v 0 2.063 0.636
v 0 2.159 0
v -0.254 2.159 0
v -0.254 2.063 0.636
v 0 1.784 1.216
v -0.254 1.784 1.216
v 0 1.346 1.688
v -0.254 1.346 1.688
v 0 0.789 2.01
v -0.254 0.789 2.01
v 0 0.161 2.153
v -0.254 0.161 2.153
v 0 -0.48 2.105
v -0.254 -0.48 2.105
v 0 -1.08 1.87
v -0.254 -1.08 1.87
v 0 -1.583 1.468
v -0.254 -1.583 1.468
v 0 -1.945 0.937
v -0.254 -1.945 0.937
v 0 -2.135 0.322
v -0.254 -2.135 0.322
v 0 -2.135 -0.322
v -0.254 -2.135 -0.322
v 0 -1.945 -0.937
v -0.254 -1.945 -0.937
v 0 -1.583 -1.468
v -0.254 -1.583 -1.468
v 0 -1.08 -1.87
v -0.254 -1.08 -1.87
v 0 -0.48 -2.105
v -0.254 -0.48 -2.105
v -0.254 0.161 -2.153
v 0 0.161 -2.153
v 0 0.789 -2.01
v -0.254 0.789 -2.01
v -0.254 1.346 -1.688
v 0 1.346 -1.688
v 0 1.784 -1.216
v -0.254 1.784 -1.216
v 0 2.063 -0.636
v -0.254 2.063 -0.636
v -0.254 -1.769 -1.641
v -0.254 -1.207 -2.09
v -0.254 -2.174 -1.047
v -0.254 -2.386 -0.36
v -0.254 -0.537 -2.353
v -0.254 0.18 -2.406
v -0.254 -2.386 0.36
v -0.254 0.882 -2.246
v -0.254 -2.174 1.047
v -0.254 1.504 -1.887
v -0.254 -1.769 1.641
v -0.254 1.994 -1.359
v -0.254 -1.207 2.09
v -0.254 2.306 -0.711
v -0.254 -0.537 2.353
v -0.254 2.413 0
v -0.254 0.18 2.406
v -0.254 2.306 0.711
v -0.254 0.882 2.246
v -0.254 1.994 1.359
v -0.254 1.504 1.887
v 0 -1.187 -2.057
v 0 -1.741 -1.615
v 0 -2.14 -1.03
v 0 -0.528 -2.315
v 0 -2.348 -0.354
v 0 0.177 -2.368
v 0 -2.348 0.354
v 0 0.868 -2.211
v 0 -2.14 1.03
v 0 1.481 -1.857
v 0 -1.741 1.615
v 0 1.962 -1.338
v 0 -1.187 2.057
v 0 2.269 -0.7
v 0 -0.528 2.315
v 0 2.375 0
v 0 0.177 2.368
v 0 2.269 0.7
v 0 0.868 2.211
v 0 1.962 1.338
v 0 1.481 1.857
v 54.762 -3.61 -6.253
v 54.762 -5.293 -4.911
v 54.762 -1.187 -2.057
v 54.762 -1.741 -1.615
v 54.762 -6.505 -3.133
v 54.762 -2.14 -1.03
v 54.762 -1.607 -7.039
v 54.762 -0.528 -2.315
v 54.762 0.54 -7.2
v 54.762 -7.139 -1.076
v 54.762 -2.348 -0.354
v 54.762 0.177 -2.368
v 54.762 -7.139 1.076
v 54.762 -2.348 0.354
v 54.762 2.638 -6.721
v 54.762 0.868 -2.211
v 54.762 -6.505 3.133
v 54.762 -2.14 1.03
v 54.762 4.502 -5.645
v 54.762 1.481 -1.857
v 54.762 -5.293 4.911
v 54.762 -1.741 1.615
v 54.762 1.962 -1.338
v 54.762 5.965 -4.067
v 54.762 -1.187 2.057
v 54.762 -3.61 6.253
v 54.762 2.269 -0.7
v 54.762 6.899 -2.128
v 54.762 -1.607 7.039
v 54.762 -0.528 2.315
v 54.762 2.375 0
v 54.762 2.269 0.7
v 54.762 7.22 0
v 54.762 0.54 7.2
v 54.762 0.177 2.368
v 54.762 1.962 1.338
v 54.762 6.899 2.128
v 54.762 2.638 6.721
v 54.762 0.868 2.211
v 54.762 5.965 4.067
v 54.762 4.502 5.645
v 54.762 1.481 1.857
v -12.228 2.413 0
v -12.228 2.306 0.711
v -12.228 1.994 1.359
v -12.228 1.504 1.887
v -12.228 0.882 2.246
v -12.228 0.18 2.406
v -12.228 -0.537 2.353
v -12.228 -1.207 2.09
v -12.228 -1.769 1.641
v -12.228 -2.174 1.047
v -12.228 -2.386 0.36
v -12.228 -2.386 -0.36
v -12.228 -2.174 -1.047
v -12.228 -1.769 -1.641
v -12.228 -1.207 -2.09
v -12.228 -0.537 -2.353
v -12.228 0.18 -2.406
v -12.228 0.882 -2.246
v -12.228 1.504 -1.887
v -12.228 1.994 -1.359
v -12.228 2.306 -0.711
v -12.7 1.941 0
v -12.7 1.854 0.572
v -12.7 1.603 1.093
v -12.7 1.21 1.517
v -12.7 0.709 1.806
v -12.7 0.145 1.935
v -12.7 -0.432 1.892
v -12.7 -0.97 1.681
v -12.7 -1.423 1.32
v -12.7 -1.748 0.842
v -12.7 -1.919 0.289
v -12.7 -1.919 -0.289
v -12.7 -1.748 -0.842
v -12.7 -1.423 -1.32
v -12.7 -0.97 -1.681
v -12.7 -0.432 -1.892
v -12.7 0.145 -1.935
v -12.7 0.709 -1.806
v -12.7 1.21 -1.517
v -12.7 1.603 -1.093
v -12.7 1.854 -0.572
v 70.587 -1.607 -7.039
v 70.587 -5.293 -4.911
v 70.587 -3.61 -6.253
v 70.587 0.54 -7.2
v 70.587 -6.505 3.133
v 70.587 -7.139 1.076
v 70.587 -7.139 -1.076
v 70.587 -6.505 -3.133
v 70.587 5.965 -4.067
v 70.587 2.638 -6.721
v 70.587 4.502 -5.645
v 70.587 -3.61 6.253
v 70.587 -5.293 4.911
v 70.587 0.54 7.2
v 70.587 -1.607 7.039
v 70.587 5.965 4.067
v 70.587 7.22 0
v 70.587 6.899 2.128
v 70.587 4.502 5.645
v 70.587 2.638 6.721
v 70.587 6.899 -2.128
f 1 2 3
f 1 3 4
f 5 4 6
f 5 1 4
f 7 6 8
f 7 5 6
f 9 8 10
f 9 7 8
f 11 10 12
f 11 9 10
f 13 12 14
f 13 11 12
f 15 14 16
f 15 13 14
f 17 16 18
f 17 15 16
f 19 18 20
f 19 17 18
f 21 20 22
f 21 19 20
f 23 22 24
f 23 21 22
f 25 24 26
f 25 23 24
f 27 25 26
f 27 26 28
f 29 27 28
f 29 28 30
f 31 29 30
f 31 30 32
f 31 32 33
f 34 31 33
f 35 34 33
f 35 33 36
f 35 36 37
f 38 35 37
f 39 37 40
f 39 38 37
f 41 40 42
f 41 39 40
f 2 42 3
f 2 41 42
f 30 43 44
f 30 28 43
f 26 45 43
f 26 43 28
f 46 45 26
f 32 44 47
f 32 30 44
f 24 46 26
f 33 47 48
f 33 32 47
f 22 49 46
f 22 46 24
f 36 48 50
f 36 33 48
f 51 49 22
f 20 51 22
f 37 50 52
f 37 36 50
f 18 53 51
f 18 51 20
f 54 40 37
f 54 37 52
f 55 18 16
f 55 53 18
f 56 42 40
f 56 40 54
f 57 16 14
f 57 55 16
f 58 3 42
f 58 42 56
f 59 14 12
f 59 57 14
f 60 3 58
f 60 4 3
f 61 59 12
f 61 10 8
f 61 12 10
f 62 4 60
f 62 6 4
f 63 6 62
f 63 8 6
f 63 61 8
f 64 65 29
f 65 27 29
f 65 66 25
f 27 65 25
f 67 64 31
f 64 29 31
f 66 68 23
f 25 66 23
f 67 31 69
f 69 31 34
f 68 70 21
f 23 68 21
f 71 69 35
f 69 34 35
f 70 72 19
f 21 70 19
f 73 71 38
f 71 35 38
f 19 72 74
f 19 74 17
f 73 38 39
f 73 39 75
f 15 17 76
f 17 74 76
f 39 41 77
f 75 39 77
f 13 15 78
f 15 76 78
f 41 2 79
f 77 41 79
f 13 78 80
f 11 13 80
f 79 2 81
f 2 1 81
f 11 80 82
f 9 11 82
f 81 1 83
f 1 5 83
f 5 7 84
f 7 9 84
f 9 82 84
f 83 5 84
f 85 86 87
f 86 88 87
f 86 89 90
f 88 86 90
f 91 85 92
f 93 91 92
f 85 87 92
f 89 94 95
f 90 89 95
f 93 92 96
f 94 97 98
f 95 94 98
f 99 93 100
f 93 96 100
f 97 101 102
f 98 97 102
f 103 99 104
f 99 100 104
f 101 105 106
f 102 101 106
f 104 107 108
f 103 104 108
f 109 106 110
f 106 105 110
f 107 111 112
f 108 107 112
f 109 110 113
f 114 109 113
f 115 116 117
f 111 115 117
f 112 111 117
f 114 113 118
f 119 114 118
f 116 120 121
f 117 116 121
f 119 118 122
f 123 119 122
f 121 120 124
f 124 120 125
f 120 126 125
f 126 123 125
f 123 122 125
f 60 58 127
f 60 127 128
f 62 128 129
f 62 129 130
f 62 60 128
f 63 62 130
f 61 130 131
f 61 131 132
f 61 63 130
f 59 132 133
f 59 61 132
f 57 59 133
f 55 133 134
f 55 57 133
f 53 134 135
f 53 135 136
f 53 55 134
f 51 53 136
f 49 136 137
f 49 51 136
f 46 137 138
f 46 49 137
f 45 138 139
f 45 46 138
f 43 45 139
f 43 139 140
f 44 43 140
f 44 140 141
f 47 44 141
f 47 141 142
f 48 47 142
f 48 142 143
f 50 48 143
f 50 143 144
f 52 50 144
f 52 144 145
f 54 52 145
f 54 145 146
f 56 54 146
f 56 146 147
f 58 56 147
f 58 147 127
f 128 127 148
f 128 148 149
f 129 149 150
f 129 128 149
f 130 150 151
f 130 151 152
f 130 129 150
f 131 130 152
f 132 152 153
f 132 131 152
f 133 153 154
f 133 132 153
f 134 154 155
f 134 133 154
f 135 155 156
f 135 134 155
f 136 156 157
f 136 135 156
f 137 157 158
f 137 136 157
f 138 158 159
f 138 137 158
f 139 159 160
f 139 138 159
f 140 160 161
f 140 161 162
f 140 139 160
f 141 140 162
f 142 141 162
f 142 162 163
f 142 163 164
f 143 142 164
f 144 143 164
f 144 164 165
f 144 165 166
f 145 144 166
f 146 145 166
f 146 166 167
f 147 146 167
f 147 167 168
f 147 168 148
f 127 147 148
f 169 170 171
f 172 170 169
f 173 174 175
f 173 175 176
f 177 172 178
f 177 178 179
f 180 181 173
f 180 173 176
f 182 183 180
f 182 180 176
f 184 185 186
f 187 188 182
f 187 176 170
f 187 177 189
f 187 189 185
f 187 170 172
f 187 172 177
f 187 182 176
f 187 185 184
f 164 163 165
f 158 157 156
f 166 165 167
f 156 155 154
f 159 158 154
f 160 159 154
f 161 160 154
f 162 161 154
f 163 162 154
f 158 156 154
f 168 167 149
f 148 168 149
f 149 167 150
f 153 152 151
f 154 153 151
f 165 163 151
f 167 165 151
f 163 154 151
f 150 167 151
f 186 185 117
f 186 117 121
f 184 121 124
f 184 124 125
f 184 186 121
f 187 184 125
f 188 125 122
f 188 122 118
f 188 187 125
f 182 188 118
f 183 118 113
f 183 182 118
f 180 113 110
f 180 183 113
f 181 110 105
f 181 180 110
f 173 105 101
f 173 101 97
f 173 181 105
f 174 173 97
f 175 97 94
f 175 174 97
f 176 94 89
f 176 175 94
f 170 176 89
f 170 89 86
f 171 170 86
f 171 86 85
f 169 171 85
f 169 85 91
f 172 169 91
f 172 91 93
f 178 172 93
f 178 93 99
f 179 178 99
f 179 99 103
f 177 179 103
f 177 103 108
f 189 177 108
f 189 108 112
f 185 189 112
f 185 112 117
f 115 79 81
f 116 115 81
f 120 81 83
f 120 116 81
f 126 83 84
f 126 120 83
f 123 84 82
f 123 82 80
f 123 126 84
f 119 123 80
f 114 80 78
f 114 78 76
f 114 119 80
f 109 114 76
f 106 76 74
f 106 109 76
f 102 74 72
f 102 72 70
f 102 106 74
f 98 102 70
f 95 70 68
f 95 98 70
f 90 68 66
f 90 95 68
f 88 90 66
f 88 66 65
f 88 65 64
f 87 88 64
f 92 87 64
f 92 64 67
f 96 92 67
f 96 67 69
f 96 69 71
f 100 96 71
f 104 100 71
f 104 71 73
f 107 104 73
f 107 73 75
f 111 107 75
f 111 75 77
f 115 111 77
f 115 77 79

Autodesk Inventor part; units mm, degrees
sketch "Sketch_1" plane through (0, 0, 0) normal (0, 0, 1) x (1, 0, 0)
  line L0 (70.5866, 0) -> (0, 0)
  line L1 (0, 0) -> (0, 2.3749)
  line L2 (0, 2.3749) -> (54.7624, 2.3749)
  line L3 (54.7624, 2.3749) -> (54.7624, 7.22)
  line L4 (54.7624, 7.22) -> (70.5866, 7.22)
  line L5 (70.5866, 7.22) -> (70.5866, 0)
  line L6 (70.5866, 0) -> (0, 0)
revolve "Revolution1" add sketch "Sketch_1" angle 360 about axis through (70.5866, 0, 0) along (1, 0, 0)
sketch "Sketch_3" plane through (0, 0, 0) normal (0, 0, 1) x (1, 0, 0)
  line L0 (0, 0) -> (-12.7, 0)
  line L1 (-12.7, 0) -> (-12.7, 1.9406)
  line L2 (-12.7, 1.9406) -> (-12.2276, 2.413)
  line L3 (-12.2276, 2.413) -> (0, 2.413)
  line L4 (0, 2.413) -> (0, 0)
  line L5 (0, 0) -> (-12.7, 0)
revolve "Revolution2" add sketch "Sketch_3" angle 360 about axis through (0, 0, 0) along (1, 0, 0)
thread "Thread1" size "10-32 UNF" class "2A" standard "ANSI Unified Screw Threads" full length
sketch "Sketch_30" plane through (0, 0, 0) normal (0, 0, 1) x (1, 0, 0)
  line L0 (0, 0) -> (-0.254, 0)
  line L1 (-0.254, 2.159) -> (0, 2.159)
  line L2 (0, 2.159) -> (0, 2.667)
  line L3 (0, 2.667) -> (-0.254, 2.667)
  line L4 (-0.254, 2.667) -> (-0.254, 2.159)
revolve "Revolution3" cut sketch "Sketch_30" angle 360 about axis through (0, 0, 0) along (1, 0, 0)
ref_plane "dia1_XY" through (0, 2.3749, 0) normal (1, 0, 0) x (0, 0, -1)
ref_plane "dia1_YZ" through (0, 2.3749, 0) normal (0, 0, -1) x (0, 1, 0)
ref_plane "dia1_ZX" through (0, 2.3749, 0) normal (0, 1, 0) x (1, 0, 0)
ref_plane "dia12_XY" through (0, 0, 7.8105) normal (1, 0, 0) x (0, 0, -1)
ref_plane "dia12_YZ" through (0, 0, 7.8105) normal (0, 0, -1) x (0, 1, 0)
ref_plane "dia12_ZX" through (0, 0, 7.8105) normal (0, 1, 0) x (1, 0, 0)
ref_plane "dia2_XY" through (0, -2.3749, 0) normal (1, 0, 0) x (0, 0, -1)
ref_plane "dia2_YZ" through (0, -2.3749, 0) normal (0, 0, -1) x (0, 1, 0)
ref_plane "dia2_ZX" through (0, -2.3749, 0) normal (0, 1, 0) x (1, 0, 0)
ref_plane "dia22_XY" through (0, 0, -7.8105) normal (1, 0, 0) x (0, 0, -1)
ref_plane "dia22_YZ" through (0, 0, -7.8105) normal (0, 0, -1) x (0, 1, 0)
ref_plane "dia22_ZX" through (0, 0, -7.8105) normal (0, 1, 0) x (1, 0, 0)
ref_plane "rl1_XY" through (-12.7, 0, 0) normal (1, 0, 0) x (0, 0, -1)
ref_plane "rl1_YZ" through (-12.7, 0, 0) normal (0, 0, -1) x (0, 1, 0)
ref_plane "rl1_ZX" through (-12.7, 0, 0) normal (0, 1, 0) x (1, 0, 0)
ref_plane "rl2_XY" through (0, 0, 0) normal (1, 0, 0) x (0, 0, -1)
ref_plane "rl2_YZ" through (0, 0, 0) normal (0, 0, -1) x (0, 1, 0)
ref_plane "rl2_ZX" through (0, 0, 0) normal (0, 1, 0) x (1, 0, 0)
ref_plane "rod_cp_XY" through (0, 0, 0) normal (1, 0, 0) x (0, 0, -1)
ref_plane "rod_cp_YZ" through (0, 0, 0) normal (0, 0, -1) x (0, 1, 0)
ref_plane "rod_cp_ZX" through (0, 0, 0) normal (0, 1, 0) x (1, 0, 0)
ref_plane "thd1_XY" through (-12.7, 2.413, 0) normal (1, 0, 0) x (0, 0, -1)
ref_plane "thd1_YZ" through (-12.7, 2.413, 0) normal (0, 0, -1) x (0, 1, 0)
ref_plane "thd1_ZX" through (-12.7, 2.413, 0) normal (0, 1, 0) x (1, 0, 0)
ref_plane "thd2_XY" through (-12.7, -2.413, 0) normal (1, 0, 0) x (0, 0, -1)
ref_plane "thd2_YZ" through (-12.7, -2.413, 0) normal (0, 0, -1) x (0, 1, 0)
ref_plane "thd2_ZX" through (-12.7, -2.413, 0) normal (0, 1, 0) x (1, 0, 0)
ref_plane "to_rod_clevis_XY" through (-12.7, 0, 0) normal (1, 0, 0) x (0, 0, -1)
ref_plane "to_rod_clevis_YZ" through (-12.7, 0, 0) normal (0, 0, -1) x (0, 1, 0)
ref_plane "to_rod_clevis_ZX" through (-12.7, 0, 0) normal (0, 1, 0) x (1, 0, 0)
properties part number "021-DXP0000_rod"
